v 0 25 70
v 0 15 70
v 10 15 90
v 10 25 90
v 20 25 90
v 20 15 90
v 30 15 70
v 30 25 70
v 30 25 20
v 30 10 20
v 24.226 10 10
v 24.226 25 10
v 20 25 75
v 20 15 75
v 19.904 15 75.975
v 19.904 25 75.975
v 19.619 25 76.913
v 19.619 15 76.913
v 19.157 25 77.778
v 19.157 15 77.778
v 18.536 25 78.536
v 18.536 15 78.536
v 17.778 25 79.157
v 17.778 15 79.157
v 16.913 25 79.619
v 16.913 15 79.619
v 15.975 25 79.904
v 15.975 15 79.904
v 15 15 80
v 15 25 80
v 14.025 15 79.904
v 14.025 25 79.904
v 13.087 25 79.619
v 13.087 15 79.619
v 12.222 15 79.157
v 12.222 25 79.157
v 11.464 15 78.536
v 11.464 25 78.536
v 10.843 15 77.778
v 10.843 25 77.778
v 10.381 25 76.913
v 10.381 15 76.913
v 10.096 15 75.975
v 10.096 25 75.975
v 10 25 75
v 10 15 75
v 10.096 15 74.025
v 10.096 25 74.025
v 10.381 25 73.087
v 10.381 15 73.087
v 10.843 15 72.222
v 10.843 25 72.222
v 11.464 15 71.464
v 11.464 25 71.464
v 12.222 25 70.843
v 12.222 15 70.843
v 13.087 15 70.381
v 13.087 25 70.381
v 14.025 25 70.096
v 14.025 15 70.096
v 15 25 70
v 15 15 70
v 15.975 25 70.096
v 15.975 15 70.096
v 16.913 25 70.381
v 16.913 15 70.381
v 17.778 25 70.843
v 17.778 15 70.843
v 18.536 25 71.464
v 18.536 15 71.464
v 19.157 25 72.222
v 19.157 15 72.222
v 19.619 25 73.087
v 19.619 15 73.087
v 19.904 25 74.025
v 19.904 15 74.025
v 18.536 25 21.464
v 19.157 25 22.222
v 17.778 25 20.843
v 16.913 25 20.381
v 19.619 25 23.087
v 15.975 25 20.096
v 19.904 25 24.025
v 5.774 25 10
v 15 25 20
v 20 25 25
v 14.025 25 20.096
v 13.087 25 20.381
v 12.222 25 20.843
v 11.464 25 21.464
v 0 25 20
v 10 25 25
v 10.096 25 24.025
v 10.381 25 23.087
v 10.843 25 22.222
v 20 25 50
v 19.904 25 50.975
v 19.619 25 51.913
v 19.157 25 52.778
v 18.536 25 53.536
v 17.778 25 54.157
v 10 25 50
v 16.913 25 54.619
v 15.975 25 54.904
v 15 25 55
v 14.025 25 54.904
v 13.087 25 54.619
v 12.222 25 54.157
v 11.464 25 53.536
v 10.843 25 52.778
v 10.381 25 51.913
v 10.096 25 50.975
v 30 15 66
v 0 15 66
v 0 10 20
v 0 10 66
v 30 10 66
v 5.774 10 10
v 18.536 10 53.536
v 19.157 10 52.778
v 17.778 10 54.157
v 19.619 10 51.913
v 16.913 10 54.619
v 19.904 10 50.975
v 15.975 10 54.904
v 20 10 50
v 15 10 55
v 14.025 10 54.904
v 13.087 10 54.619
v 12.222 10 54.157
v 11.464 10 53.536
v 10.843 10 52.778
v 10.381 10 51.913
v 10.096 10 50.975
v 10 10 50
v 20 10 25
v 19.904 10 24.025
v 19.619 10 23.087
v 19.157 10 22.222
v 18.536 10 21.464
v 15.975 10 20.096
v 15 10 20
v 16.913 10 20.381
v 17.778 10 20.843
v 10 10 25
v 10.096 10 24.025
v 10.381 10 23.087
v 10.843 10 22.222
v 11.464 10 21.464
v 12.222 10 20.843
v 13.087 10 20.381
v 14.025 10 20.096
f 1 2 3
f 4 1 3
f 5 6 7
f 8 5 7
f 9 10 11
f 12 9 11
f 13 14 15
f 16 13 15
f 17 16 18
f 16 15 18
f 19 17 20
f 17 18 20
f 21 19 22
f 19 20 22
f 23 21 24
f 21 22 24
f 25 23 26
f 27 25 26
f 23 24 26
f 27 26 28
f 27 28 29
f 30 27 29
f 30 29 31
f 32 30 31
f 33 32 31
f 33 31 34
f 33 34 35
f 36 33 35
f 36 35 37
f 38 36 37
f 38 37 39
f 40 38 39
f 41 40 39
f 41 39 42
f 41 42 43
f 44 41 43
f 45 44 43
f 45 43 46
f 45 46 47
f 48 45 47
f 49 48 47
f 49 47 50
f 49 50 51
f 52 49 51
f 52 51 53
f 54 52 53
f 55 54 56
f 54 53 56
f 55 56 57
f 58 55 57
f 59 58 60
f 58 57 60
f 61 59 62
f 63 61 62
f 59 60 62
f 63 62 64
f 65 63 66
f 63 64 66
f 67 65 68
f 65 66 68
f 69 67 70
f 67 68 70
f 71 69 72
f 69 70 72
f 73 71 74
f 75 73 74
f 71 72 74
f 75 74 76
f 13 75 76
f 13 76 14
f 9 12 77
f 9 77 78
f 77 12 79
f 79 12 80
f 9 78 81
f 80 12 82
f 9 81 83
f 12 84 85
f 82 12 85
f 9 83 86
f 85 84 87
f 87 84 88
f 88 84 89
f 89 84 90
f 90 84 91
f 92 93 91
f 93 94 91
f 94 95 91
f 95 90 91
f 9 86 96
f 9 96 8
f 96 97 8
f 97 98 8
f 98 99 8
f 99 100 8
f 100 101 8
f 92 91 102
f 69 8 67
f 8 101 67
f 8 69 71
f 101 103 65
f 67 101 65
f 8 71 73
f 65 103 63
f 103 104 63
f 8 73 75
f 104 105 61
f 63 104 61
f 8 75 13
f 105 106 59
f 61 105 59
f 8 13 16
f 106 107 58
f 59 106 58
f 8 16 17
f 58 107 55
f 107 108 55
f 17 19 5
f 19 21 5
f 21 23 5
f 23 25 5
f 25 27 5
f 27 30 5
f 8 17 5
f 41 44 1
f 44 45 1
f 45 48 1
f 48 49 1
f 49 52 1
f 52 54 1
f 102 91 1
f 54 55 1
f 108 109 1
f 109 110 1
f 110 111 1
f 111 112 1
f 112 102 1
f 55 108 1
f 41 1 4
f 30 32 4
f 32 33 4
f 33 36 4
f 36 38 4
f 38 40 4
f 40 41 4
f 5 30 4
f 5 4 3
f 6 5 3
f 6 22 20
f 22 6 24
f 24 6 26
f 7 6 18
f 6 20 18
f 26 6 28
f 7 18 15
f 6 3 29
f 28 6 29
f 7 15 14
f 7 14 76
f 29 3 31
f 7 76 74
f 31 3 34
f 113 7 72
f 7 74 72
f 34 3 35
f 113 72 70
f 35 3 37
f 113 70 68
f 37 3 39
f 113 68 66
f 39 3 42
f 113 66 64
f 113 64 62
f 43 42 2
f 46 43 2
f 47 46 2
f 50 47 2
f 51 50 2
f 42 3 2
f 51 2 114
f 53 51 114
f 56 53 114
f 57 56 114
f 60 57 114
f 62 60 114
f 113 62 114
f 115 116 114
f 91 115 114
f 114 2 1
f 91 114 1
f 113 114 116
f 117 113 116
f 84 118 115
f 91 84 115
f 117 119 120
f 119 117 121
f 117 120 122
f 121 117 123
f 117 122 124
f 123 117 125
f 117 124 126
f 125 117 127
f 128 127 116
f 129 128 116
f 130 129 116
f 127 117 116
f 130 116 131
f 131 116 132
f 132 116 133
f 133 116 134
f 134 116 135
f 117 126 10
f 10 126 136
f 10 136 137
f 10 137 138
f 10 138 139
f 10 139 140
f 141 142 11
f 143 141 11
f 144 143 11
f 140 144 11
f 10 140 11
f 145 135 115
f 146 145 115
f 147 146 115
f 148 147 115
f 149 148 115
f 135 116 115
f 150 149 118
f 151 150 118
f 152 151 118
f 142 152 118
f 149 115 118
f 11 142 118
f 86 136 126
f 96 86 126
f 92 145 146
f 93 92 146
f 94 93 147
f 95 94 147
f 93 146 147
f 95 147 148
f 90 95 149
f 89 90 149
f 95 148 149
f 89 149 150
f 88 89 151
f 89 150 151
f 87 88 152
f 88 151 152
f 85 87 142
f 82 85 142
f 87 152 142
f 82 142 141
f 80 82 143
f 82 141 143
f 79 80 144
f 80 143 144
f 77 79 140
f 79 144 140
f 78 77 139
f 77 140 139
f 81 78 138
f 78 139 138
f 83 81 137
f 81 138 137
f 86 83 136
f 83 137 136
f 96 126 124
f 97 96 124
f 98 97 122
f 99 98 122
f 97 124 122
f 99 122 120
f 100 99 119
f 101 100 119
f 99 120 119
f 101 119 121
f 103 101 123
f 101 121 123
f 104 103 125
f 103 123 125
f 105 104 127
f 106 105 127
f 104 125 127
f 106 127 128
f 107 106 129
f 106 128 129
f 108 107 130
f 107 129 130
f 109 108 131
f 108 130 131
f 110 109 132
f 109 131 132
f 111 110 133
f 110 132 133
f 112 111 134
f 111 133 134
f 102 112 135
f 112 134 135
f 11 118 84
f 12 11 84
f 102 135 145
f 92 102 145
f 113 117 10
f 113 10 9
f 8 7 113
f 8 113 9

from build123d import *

# Parameters (mm, degrees)
F1_DEPTH = 30
F2_R     = 5
F3_DEPTH = 15.001
F4_DEPTH = 15.001


with BuildPart() as f1:
    # F0 (on Right) → F1 (new body)
    with BuildSketch(Plane.YZ):
        Polygon((15, 66), (10, 66), (10, 10), (25, 10), (25, 90), (15, 90), align=None)
    extrude(amount=F1_DEPTH)

    # F2 (on face) → F3 (cut, through all)
    with BuildSketch(Plane.XZ.offset(-10)):
        with BuildLine():
            Line((10, 50), (10, 25))
            ThreePointArc((10, 25), (15, 20), (20, 25))
            Line((20, 25), (20, 50))
            ThreePointArc((20, 50), (15, 55), (10, 50))
        make_face()
        with Locations((15, 75)):
            Circle(F2_R)
        Polygon((30, 10), (30, 20), (24.226497, 10), align=None)
        Polygon((5.773503, 10), (0, 20), (0, 10), align=None)
    extrude(amount=-F3_DEPTH, mode=Mode.SUBTRACT)

    # F2 (on face) → F4 (cut, through all)
    with BuildSketch(Plane.XZ.offset(-10)):
        Polygon((0, 70), (10, 90), (0, 90), align=None)
        Polygon((30, 90), (20, 90), (30, 70), align=None)
    extrude(amount=-F4_DEPTH, mode=Mode.SUBTRACT)


solid = f1.part
